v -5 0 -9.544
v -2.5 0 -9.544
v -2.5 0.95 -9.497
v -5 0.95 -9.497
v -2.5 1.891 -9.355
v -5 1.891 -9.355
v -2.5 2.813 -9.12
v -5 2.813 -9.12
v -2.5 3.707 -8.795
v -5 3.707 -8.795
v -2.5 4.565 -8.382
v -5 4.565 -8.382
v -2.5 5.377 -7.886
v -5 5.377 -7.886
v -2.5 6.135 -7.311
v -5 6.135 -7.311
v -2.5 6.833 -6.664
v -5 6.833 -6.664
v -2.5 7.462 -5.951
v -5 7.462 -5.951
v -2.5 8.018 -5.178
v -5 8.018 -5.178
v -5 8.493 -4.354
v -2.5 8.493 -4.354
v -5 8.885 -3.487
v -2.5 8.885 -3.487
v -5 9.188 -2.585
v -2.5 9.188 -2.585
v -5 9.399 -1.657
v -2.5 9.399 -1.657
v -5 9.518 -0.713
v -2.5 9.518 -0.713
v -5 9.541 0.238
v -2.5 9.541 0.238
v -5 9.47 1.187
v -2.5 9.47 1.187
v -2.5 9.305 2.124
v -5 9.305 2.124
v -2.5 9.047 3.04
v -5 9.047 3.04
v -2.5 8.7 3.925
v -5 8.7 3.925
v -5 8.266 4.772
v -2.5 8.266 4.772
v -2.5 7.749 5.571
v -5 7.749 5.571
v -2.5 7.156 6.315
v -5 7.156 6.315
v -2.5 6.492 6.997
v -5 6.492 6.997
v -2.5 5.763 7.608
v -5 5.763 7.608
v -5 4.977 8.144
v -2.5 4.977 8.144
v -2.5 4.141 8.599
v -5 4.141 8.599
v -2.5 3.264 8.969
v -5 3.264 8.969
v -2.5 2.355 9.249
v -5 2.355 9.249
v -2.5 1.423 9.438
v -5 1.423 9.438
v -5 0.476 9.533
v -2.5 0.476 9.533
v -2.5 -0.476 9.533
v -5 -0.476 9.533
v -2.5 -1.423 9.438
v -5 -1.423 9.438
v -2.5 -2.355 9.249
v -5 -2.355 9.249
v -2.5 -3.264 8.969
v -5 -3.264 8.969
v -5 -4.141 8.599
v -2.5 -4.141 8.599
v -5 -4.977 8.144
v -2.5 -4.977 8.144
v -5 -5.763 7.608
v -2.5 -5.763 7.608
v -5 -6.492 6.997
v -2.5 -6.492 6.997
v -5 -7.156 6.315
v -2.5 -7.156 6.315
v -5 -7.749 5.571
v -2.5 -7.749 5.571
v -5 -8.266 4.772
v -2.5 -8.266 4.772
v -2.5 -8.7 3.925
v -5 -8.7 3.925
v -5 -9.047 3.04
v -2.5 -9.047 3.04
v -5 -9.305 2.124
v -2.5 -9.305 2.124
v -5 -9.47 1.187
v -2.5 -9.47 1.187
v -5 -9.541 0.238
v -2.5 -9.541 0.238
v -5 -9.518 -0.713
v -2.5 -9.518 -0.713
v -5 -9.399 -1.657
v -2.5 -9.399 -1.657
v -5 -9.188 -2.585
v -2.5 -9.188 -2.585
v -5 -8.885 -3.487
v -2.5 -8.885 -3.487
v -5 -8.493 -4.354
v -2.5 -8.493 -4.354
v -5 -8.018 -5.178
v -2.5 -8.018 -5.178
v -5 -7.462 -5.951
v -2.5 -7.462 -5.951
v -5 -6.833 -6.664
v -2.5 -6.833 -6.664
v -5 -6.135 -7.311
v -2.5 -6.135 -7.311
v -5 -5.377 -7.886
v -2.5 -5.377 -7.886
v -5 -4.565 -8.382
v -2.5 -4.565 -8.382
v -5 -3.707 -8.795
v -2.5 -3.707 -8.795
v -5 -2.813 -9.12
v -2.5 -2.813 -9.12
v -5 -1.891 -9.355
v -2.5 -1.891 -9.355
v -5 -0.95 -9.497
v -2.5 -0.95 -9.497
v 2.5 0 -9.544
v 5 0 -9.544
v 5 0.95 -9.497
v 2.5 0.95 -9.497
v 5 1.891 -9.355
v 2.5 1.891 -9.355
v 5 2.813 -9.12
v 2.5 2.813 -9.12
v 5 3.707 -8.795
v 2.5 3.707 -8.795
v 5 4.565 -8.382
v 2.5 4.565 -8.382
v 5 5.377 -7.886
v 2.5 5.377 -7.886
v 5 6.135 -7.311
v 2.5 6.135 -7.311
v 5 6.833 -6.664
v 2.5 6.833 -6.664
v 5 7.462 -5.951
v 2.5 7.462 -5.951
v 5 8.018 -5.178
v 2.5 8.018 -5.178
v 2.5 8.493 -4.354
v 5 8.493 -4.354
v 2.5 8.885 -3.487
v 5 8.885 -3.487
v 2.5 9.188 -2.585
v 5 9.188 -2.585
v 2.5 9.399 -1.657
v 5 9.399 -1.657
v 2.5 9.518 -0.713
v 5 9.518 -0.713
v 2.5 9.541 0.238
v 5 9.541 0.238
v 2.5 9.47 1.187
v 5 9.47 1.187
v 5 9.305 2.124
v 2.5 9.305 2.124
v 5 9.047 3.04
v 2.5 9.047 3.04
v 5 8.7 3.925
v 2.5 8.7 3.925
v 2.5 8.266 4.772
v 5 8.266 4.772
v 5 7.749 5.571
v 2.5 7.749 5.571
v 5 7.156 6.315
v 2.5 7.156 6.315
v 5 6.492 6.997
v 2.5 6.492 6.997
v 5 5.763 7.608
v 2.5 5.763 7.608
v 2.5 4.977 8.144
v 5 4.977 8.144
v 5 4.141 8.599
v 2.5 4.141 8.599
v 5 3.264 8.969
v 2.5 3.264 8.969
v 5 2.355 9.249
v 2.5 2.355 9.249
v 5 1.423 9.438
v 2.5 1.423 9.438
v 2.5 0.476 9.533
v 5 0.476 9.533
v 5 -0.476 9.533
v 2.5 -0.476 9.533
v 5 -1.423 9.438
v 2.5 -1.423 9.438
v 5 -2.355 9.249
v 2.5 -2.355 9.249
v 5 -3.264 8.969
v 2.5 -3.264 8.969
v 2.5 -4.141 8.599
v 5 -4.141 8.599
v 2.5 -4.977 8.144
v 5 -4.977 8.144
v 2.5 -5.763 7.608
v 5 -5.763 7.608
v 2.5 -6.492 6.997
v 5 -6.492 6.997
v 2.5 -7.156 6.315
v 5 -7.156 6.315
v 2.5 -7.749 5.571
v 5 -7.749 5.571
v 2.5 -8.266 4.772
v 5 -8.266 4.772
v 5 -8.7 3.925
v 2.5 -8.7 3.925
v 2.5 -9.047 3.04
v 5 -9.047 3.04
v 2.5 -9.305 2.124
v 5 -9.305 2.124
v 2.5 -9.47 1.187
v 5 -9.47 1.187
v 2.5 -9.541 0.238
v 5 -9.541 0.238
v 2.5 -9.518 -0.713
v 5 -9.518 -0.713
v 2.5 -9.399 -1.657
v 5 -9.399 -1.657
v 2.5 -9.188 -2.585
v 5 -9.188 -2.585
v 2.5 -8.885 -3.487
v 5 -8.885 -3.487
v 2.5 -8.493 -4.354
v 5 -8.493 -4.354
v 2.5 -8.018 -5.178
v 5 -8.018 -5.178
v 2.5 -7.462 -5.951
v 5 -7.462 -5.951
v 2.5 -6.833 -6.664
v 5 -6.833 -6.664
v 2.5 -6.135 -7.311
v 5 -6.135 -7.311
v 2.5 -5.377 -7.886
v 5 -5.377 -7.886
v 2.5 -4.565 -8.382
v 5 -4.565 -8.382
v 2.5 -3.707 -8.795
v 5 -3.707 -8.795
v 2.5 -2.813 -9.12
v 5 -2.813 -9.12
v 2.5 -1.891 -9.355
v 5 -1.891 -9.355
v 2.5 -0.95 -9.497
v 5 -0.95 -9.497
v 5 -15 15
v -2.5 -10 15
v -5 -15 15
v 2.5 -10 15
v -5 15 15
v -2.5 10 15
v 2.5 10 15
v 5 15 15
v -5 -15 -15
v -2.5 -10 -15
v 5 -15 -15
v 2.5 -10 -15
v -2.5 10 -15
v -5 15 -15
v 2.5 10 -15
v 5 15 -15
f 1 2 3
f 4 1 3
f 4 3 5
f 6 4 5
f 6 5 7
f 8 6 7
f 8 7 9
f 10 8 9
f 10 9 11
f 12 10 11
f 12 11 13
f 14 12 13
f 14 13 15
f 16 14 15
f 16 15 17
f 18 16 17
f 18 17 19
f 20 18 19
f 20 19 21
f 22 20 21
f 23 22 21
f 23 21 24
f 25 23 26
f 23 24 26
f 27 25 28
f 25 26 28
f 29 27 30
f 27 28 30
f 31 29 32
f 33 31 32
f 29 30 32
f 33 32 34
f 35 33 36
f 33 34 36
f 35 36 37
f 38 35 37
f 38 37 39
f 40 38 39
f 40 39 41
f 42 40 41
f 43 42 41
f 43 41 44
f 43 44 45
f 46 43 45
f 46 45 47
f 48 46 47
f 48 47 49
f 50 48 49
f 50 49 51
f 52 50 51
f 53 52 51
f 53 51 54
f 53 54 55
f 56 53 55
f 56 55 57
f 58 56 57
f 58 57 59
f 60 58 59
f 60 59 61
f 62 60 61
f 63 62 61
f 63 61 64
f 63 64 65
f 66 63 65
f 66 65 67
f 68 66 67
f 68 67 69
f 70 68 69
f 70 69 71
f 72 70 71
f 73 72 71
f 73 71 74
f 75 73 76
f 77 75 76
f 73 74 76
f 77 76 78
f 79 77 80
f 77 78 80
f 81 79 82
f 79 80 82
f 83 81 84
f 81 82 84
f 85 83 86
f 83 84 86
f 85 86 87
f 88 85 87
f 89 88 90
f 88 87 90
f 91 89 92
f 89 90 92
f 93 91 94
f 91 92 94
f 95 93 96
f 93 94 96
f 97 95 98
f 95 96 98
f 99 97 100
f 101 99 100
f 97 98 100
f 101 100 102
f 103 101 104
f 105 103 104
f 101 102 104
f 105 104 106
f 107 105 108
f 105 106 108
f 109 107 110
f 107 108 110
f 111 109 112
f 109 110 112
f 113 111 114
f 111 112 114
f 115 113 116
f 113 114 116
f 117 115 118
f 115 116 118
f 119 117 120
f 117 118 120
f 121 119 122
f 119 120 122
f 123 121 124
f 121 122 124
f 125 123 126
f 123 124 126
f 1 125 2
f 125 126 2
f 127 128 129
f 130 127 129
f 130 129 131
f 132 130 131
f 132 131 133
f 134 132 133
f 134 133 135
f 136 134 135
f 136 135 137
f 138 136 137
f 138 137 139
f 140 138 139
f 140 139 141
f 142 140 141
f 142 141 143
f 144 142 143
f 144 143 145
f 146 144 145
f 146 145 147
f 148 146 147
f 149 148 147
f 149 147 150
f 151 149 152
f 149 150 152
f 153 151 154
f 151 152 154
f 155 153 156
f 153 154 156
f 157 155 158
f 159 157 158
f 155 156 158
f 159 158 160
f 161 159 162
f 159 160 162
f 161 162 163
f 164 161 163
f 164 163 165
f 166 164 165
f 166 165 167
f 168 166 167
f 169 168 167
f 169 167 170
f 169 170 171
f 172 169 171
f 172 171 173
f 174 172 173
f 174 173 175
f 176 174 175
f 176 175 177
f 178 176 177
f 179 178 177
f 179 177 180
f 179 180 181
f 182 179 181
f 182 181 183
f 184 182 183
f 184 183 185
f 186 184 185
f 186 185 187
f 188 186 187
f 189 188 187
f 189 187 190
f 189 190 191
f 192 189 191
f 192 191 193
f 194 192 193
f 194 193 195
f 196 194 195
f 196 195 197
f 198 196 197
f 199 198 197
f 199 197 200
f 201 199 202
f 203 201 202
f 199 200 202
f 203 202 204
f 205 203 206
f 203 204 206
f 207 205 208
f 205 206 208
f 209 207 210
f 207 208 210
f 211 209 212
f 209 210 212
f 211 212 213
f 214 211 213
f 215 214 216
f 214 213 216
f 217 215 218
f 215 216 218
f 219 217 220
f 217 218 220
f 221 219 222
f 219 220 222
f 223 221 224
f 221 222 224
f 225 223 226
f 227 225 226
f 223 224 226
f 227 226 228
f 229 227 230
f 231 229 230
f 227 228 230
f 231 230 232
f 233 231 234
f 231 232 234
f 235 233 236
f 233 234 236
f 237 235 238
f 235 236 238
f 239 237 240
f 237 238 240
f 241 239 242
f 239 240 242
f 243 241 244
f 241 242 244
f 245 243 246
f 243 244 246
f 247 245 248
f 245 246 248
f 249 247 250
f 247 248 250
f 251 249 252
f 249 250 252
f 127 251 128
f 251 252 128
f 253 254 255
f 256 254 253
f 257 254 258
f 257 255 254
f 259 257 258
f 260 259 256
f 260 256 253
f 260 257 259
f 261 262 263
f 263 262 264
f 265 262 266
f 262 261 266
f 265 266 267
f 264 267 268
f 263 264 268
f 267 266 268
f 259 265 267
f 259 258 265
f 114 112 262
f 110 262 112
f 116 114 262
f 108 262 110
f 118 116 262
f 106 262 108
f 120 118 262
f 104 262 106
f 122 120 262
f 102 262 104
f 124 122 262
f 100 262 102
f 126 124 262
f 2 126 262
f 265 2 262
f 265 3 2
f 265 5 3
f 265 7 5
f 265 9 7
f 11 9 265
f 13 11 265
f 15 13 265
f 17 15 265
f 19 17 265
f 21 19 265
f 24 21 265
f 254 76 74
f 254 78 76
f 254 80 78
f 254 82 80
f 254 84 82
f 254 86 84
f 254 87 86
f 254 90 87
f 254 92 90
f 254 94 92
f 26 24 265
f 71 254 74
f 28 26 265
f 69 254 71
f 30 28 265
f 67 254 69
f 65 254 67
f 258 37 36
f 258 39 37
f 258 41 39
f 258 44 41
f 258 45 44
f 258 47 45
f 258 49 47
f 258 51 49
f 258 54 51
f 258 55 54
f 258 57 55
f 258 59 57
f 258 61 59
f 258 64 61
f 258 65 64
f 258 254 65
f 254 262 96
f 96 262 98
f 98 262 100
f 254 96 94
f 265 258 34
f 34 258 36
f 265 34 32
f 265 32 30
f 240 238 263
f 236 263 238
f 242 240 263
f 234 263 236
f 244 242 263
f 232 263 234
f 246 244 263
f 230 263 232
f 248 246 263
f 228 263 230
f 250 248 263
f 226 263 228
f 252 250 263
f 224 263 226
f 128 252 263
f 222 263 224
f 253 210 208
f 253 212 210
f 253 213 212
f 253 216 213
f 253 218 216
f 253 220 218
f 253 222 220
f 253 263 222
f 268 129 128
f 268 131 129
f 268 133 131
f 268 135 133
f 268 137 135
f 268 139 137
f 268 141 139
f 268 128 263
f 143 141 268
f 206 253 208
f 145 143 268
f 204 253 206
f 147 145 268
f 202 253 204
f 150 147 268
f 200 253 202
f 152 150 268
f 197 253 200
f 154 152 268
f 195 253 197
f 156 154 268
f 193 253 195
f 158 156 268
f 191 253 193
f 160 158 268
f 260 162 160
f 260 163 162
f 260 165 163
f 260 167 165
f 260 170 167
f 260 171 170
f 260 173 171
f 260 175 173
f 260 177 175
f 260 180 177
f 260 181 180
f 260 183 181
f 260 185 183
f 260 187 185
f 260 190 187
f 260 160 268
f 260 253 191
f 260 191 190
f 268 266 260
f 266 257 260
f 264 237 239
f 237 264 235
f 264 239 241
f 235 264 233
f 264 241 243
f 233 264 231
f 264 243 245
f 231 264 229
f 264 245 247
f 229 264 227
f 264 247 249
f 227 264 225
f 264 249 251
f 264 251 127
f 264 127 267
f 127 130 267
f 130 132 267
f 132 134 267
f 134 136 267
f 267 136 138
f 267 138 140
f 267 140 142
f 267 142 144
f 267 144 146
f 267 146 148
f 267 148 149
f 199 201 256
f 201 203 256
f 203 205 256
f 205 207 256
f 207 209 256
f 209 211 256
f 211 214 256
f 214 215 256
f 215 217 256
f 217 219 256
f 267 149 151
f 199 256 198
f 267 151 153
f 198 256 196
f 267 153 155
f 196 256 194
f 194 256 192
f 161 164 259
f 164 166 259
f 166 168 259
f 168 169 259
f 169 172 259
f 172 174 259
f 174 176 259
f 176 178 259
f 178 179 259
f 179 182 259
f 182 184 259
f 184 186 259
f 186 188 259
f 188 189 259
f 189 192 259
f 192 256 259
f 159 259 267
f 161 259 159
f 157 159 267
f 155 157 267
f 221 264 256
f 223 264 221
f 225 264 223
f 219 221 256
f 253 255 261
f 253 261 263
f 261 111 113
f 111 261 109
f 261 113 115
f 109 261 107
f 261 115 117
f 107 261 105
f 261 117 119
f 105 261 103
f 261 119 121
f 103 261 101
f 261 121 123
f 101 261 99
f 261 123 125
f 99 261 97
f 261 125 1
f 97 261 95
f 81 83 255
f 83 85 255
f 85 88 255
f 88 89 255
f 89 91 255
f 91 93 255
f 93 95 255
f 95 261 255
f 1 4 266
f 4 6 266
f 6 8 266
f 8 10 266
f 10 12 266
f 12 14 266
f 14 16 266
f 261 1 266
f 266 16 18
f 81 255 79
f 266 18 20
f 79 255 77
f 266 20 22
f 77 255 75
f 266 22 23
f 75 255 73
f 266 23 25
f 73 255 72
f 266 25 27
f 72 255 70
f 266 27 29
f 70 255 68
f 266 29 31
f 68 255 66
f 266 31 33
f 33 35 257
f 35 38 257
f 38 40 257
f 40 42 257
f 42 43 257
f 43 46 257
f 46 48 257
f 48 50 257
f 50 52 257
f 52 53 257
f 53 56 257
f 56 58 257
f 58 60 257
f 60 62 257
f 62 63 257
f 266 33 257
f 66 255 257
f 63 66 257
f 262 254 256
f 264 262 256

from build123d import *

# Parameters (mm, degrees)
SKETCH_1_W          = 10
SKETCH_1_H          = 30
SKETCH_1_W_2        = 5
SKETCH_1_H_2        = 20
EXTRUDE_1_DEPTH     = 15
SKETCH_2_R          = 9.544400842
CUT_EXTRUDE_1_DEPTH = 30


with BuildPart() as part:
    # 草图1 → 凸台-拉伸1 (new, symmetric)
    with BuildSketch(Plane.XY):
        Rectangle(SKETCH_1_W, SKETCH_1_H)
        Rectangle(SKETCH_1_W_2, SKETCH_1_H_2, mode=Mode.SUBTRACT)
    extrude(amount=EXTRUDE_1_DEPTH, both=True)

    # 草图2 → 切除-拉伸1 (cut)
    with BuildSketch(Plane(origin=(5, 0, 0), x_dir=(0, 0, -1), z_dir=(1, 0, 0))):
        Circle(SKETCH_2_R)
    extrude(amount=-CUT_EXTRUDE_1_DEPTH, mode=Mode.SUBTRACT)


solid = part.part
